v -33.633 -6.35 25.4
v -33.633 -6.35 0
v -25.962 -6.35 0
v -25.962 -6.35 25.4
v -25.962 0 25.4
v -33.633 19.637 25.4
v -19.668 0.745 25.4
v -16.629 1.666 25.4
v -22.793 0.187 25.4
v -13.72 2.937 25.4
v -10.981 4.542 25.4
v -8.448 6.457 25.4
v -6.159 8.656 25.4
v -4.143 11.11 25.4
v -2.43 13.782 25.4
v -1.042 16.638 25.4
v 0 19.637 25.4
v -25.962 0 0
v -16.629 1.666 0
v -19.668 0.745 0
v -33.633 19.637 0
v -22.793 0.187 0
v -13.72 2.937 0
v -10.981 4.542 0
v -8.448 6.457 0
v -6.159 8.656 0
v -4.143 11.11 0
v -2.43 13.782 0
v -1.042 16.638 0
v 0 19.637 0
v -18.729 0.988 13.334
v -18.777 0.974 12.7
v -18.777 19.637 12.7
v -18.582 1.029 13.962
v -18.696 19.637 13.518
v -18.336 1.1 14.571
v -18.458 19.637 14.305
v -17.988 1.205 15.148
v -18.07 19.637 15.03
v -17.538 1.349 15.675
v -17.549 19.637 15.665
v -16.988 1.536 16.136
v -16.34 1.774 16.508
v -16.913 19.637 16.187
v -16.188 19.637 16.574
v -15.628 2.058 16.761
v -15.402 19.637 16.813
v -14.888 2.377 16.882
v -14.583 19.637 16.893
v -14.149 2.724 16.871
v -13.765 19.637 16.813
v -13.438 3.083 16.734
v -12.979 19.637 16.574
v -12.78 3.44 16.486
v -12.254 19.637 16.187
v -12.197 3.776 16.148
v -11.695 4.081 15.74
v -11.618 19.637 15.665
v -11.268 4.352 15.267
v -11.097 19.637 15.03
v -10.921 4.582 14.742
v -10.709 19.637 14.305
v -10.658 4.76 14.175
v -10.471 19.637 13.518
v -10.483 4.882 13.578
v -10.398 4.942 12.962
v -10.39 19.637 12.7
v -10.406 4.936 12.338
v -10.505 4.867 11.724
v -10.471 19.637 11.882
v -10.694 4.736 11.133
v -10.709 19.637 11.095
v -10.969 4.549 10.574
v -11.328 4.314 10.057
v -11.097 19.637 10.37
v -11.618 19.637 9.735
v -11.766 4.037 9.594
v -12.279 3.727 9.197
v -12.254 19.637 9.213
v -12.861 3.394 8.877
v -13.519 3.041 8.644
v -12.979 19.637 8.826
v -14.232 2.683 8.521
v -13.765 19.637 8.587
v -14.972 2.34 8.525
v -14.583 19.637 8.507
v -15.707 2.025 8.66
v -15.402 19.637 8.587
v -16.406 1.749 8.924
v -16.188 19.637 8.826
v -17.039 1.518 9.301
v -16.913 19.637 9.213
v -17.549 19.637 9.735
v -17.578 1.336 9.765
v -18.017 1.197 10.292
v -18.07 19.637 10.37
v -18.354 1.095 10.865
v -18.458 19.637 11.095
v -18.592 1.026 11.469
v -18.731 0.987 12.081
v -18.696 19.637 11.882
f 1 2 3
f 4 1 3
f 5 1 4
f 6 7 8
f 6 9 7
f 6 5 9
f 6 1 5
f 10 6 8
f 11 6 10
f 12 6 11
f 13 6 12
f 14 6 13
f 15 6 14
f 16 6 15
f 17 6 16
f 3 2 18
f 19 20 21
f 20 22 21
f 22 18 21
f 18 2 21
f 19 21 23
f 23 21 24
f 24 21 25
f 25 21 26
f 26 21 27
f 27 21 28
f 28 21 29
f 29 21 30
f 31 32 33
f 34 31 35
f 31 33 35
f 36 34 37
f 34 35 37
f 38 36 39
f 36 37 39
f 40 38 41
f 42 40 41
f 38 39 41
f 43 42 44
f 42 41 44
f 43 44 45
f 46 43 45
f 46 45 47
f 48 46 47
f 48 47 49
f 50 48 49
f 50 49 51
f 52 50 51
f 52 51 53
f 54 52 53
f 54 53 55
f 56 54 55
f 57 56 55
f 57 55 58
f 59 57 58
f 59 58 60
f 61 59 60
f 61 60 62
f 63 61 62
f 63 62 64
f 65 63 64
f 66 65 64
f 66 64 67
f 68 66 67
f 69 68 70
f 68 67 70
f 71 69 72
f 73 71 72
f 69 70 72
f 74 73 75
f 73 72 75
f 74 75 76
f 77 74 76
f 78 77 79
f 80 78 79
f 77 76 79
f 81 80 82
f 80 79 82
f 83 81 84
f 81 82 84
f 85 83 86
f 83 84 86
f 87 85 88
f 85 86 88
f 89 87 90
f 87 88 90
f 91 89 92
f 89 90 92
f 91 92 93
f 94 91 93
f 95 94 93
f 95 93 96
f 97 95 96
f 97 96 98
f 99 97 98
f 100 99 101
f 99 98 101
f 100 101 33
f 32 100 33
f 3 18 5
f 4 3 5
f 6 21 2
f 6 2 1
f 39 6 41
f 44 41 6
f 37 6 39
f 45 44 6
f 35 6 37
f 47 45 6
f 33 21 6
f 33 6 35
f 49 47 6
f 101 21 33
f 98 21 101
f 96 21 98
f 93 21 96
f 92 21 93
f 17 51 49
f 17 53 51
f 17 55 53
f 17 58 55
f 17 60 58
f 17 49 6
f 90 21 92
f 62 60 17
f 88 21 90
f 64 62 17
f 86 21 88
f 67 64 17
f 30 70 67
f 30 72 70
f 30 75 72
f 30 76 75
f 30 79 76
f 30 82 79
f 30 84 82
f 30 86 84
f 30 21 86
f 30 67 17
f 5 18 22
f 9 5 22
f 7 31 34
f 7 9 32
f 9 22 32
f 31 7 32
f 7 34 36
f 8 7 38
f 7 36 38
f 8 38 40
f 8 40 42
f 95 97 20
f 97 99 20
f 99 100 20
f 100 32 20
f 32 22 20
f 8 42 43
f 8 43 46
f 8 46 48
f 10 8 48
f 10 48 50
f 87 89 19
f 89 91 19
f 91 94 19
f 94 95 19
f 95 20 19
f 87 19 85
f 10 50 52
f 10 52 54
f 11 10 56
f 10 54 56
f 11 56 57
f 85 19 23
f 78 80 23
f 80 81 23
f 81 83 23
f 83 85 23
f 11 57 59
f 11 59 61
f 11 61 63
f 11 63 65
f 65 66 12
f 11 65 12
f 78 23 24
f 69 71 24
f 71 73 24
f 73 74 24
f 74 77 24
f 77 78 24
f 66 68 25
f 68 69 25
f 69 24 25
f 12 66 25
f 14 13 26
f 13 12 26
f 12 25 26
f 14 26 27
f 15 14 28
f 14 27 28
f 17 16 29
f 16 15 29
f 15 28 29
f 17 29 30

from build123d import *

# Parameters (mm, degrees)
F0_W        = 33.6334481835
F0_H        = 19.636919722
F1_DEPTH    = 25.4
F2_T1_DEPTH = 155.2122388964
F3_R        = 4.1932918126
F4_DEPTH    = 41.402
F5_DEPTH    = 6.35


# Not quite as in the source:
# - a fillet or chamfer that OpenCascade refuses, or shapes differently, is made with other operations: its cross-section is extruded or revolved along the edge and cut away or added


with BuildPart() as f1:
    # F0 (on Top) → F1 (new body)
    with BuildSketch(Plane.XY):
        with Locations((-16.8167240918, 9.818459861)):
            Rectangle(F0_W, F0_H)
    extrude(amount=F1_DEPTH)

    # F2: fillet of radius 26.9812507731 on 1 edges, made by hand

    # F2_s2 → F2_t1 (cut)
    with BuildSketch(Plane.XY.offset(-64.9061194482)):
        with BuildLine():
            ThreePointArc((-25.9624477793, 0), (-9.6862587992, 5.4621066087), (0, 19.636919722))
            Line((0, 19.636919722), (0, 0))
            Line((0, 0), (-25.9624477793, 0))
        make_face()
    extrude(amount=F2_T1_DEPTH, mode=Mode.SUBTRACT)

    # F3 (on face) → F4 (cut)
    with BuildSketch(Plane(origin=(0, 19.636919722, 0), x_dir=(-1, 0, 0), z_dir=(0, 1, 0))):
        with Locations((14.5834481835, 12.7)):
            Circle(F3_R)
    extrude(amount=-F4_DEPTH, mode=Mode.SUBTRACT)

    # F5 (add): a face of the model
    f5_faces = [f1.faces().sort_by_distance(p)[0] for p in [
        (-29.7979479814, 0, 12.7),
    ]]
    extrude(f5_faces, amount=F5_DEPTH)


solid = f1.part
